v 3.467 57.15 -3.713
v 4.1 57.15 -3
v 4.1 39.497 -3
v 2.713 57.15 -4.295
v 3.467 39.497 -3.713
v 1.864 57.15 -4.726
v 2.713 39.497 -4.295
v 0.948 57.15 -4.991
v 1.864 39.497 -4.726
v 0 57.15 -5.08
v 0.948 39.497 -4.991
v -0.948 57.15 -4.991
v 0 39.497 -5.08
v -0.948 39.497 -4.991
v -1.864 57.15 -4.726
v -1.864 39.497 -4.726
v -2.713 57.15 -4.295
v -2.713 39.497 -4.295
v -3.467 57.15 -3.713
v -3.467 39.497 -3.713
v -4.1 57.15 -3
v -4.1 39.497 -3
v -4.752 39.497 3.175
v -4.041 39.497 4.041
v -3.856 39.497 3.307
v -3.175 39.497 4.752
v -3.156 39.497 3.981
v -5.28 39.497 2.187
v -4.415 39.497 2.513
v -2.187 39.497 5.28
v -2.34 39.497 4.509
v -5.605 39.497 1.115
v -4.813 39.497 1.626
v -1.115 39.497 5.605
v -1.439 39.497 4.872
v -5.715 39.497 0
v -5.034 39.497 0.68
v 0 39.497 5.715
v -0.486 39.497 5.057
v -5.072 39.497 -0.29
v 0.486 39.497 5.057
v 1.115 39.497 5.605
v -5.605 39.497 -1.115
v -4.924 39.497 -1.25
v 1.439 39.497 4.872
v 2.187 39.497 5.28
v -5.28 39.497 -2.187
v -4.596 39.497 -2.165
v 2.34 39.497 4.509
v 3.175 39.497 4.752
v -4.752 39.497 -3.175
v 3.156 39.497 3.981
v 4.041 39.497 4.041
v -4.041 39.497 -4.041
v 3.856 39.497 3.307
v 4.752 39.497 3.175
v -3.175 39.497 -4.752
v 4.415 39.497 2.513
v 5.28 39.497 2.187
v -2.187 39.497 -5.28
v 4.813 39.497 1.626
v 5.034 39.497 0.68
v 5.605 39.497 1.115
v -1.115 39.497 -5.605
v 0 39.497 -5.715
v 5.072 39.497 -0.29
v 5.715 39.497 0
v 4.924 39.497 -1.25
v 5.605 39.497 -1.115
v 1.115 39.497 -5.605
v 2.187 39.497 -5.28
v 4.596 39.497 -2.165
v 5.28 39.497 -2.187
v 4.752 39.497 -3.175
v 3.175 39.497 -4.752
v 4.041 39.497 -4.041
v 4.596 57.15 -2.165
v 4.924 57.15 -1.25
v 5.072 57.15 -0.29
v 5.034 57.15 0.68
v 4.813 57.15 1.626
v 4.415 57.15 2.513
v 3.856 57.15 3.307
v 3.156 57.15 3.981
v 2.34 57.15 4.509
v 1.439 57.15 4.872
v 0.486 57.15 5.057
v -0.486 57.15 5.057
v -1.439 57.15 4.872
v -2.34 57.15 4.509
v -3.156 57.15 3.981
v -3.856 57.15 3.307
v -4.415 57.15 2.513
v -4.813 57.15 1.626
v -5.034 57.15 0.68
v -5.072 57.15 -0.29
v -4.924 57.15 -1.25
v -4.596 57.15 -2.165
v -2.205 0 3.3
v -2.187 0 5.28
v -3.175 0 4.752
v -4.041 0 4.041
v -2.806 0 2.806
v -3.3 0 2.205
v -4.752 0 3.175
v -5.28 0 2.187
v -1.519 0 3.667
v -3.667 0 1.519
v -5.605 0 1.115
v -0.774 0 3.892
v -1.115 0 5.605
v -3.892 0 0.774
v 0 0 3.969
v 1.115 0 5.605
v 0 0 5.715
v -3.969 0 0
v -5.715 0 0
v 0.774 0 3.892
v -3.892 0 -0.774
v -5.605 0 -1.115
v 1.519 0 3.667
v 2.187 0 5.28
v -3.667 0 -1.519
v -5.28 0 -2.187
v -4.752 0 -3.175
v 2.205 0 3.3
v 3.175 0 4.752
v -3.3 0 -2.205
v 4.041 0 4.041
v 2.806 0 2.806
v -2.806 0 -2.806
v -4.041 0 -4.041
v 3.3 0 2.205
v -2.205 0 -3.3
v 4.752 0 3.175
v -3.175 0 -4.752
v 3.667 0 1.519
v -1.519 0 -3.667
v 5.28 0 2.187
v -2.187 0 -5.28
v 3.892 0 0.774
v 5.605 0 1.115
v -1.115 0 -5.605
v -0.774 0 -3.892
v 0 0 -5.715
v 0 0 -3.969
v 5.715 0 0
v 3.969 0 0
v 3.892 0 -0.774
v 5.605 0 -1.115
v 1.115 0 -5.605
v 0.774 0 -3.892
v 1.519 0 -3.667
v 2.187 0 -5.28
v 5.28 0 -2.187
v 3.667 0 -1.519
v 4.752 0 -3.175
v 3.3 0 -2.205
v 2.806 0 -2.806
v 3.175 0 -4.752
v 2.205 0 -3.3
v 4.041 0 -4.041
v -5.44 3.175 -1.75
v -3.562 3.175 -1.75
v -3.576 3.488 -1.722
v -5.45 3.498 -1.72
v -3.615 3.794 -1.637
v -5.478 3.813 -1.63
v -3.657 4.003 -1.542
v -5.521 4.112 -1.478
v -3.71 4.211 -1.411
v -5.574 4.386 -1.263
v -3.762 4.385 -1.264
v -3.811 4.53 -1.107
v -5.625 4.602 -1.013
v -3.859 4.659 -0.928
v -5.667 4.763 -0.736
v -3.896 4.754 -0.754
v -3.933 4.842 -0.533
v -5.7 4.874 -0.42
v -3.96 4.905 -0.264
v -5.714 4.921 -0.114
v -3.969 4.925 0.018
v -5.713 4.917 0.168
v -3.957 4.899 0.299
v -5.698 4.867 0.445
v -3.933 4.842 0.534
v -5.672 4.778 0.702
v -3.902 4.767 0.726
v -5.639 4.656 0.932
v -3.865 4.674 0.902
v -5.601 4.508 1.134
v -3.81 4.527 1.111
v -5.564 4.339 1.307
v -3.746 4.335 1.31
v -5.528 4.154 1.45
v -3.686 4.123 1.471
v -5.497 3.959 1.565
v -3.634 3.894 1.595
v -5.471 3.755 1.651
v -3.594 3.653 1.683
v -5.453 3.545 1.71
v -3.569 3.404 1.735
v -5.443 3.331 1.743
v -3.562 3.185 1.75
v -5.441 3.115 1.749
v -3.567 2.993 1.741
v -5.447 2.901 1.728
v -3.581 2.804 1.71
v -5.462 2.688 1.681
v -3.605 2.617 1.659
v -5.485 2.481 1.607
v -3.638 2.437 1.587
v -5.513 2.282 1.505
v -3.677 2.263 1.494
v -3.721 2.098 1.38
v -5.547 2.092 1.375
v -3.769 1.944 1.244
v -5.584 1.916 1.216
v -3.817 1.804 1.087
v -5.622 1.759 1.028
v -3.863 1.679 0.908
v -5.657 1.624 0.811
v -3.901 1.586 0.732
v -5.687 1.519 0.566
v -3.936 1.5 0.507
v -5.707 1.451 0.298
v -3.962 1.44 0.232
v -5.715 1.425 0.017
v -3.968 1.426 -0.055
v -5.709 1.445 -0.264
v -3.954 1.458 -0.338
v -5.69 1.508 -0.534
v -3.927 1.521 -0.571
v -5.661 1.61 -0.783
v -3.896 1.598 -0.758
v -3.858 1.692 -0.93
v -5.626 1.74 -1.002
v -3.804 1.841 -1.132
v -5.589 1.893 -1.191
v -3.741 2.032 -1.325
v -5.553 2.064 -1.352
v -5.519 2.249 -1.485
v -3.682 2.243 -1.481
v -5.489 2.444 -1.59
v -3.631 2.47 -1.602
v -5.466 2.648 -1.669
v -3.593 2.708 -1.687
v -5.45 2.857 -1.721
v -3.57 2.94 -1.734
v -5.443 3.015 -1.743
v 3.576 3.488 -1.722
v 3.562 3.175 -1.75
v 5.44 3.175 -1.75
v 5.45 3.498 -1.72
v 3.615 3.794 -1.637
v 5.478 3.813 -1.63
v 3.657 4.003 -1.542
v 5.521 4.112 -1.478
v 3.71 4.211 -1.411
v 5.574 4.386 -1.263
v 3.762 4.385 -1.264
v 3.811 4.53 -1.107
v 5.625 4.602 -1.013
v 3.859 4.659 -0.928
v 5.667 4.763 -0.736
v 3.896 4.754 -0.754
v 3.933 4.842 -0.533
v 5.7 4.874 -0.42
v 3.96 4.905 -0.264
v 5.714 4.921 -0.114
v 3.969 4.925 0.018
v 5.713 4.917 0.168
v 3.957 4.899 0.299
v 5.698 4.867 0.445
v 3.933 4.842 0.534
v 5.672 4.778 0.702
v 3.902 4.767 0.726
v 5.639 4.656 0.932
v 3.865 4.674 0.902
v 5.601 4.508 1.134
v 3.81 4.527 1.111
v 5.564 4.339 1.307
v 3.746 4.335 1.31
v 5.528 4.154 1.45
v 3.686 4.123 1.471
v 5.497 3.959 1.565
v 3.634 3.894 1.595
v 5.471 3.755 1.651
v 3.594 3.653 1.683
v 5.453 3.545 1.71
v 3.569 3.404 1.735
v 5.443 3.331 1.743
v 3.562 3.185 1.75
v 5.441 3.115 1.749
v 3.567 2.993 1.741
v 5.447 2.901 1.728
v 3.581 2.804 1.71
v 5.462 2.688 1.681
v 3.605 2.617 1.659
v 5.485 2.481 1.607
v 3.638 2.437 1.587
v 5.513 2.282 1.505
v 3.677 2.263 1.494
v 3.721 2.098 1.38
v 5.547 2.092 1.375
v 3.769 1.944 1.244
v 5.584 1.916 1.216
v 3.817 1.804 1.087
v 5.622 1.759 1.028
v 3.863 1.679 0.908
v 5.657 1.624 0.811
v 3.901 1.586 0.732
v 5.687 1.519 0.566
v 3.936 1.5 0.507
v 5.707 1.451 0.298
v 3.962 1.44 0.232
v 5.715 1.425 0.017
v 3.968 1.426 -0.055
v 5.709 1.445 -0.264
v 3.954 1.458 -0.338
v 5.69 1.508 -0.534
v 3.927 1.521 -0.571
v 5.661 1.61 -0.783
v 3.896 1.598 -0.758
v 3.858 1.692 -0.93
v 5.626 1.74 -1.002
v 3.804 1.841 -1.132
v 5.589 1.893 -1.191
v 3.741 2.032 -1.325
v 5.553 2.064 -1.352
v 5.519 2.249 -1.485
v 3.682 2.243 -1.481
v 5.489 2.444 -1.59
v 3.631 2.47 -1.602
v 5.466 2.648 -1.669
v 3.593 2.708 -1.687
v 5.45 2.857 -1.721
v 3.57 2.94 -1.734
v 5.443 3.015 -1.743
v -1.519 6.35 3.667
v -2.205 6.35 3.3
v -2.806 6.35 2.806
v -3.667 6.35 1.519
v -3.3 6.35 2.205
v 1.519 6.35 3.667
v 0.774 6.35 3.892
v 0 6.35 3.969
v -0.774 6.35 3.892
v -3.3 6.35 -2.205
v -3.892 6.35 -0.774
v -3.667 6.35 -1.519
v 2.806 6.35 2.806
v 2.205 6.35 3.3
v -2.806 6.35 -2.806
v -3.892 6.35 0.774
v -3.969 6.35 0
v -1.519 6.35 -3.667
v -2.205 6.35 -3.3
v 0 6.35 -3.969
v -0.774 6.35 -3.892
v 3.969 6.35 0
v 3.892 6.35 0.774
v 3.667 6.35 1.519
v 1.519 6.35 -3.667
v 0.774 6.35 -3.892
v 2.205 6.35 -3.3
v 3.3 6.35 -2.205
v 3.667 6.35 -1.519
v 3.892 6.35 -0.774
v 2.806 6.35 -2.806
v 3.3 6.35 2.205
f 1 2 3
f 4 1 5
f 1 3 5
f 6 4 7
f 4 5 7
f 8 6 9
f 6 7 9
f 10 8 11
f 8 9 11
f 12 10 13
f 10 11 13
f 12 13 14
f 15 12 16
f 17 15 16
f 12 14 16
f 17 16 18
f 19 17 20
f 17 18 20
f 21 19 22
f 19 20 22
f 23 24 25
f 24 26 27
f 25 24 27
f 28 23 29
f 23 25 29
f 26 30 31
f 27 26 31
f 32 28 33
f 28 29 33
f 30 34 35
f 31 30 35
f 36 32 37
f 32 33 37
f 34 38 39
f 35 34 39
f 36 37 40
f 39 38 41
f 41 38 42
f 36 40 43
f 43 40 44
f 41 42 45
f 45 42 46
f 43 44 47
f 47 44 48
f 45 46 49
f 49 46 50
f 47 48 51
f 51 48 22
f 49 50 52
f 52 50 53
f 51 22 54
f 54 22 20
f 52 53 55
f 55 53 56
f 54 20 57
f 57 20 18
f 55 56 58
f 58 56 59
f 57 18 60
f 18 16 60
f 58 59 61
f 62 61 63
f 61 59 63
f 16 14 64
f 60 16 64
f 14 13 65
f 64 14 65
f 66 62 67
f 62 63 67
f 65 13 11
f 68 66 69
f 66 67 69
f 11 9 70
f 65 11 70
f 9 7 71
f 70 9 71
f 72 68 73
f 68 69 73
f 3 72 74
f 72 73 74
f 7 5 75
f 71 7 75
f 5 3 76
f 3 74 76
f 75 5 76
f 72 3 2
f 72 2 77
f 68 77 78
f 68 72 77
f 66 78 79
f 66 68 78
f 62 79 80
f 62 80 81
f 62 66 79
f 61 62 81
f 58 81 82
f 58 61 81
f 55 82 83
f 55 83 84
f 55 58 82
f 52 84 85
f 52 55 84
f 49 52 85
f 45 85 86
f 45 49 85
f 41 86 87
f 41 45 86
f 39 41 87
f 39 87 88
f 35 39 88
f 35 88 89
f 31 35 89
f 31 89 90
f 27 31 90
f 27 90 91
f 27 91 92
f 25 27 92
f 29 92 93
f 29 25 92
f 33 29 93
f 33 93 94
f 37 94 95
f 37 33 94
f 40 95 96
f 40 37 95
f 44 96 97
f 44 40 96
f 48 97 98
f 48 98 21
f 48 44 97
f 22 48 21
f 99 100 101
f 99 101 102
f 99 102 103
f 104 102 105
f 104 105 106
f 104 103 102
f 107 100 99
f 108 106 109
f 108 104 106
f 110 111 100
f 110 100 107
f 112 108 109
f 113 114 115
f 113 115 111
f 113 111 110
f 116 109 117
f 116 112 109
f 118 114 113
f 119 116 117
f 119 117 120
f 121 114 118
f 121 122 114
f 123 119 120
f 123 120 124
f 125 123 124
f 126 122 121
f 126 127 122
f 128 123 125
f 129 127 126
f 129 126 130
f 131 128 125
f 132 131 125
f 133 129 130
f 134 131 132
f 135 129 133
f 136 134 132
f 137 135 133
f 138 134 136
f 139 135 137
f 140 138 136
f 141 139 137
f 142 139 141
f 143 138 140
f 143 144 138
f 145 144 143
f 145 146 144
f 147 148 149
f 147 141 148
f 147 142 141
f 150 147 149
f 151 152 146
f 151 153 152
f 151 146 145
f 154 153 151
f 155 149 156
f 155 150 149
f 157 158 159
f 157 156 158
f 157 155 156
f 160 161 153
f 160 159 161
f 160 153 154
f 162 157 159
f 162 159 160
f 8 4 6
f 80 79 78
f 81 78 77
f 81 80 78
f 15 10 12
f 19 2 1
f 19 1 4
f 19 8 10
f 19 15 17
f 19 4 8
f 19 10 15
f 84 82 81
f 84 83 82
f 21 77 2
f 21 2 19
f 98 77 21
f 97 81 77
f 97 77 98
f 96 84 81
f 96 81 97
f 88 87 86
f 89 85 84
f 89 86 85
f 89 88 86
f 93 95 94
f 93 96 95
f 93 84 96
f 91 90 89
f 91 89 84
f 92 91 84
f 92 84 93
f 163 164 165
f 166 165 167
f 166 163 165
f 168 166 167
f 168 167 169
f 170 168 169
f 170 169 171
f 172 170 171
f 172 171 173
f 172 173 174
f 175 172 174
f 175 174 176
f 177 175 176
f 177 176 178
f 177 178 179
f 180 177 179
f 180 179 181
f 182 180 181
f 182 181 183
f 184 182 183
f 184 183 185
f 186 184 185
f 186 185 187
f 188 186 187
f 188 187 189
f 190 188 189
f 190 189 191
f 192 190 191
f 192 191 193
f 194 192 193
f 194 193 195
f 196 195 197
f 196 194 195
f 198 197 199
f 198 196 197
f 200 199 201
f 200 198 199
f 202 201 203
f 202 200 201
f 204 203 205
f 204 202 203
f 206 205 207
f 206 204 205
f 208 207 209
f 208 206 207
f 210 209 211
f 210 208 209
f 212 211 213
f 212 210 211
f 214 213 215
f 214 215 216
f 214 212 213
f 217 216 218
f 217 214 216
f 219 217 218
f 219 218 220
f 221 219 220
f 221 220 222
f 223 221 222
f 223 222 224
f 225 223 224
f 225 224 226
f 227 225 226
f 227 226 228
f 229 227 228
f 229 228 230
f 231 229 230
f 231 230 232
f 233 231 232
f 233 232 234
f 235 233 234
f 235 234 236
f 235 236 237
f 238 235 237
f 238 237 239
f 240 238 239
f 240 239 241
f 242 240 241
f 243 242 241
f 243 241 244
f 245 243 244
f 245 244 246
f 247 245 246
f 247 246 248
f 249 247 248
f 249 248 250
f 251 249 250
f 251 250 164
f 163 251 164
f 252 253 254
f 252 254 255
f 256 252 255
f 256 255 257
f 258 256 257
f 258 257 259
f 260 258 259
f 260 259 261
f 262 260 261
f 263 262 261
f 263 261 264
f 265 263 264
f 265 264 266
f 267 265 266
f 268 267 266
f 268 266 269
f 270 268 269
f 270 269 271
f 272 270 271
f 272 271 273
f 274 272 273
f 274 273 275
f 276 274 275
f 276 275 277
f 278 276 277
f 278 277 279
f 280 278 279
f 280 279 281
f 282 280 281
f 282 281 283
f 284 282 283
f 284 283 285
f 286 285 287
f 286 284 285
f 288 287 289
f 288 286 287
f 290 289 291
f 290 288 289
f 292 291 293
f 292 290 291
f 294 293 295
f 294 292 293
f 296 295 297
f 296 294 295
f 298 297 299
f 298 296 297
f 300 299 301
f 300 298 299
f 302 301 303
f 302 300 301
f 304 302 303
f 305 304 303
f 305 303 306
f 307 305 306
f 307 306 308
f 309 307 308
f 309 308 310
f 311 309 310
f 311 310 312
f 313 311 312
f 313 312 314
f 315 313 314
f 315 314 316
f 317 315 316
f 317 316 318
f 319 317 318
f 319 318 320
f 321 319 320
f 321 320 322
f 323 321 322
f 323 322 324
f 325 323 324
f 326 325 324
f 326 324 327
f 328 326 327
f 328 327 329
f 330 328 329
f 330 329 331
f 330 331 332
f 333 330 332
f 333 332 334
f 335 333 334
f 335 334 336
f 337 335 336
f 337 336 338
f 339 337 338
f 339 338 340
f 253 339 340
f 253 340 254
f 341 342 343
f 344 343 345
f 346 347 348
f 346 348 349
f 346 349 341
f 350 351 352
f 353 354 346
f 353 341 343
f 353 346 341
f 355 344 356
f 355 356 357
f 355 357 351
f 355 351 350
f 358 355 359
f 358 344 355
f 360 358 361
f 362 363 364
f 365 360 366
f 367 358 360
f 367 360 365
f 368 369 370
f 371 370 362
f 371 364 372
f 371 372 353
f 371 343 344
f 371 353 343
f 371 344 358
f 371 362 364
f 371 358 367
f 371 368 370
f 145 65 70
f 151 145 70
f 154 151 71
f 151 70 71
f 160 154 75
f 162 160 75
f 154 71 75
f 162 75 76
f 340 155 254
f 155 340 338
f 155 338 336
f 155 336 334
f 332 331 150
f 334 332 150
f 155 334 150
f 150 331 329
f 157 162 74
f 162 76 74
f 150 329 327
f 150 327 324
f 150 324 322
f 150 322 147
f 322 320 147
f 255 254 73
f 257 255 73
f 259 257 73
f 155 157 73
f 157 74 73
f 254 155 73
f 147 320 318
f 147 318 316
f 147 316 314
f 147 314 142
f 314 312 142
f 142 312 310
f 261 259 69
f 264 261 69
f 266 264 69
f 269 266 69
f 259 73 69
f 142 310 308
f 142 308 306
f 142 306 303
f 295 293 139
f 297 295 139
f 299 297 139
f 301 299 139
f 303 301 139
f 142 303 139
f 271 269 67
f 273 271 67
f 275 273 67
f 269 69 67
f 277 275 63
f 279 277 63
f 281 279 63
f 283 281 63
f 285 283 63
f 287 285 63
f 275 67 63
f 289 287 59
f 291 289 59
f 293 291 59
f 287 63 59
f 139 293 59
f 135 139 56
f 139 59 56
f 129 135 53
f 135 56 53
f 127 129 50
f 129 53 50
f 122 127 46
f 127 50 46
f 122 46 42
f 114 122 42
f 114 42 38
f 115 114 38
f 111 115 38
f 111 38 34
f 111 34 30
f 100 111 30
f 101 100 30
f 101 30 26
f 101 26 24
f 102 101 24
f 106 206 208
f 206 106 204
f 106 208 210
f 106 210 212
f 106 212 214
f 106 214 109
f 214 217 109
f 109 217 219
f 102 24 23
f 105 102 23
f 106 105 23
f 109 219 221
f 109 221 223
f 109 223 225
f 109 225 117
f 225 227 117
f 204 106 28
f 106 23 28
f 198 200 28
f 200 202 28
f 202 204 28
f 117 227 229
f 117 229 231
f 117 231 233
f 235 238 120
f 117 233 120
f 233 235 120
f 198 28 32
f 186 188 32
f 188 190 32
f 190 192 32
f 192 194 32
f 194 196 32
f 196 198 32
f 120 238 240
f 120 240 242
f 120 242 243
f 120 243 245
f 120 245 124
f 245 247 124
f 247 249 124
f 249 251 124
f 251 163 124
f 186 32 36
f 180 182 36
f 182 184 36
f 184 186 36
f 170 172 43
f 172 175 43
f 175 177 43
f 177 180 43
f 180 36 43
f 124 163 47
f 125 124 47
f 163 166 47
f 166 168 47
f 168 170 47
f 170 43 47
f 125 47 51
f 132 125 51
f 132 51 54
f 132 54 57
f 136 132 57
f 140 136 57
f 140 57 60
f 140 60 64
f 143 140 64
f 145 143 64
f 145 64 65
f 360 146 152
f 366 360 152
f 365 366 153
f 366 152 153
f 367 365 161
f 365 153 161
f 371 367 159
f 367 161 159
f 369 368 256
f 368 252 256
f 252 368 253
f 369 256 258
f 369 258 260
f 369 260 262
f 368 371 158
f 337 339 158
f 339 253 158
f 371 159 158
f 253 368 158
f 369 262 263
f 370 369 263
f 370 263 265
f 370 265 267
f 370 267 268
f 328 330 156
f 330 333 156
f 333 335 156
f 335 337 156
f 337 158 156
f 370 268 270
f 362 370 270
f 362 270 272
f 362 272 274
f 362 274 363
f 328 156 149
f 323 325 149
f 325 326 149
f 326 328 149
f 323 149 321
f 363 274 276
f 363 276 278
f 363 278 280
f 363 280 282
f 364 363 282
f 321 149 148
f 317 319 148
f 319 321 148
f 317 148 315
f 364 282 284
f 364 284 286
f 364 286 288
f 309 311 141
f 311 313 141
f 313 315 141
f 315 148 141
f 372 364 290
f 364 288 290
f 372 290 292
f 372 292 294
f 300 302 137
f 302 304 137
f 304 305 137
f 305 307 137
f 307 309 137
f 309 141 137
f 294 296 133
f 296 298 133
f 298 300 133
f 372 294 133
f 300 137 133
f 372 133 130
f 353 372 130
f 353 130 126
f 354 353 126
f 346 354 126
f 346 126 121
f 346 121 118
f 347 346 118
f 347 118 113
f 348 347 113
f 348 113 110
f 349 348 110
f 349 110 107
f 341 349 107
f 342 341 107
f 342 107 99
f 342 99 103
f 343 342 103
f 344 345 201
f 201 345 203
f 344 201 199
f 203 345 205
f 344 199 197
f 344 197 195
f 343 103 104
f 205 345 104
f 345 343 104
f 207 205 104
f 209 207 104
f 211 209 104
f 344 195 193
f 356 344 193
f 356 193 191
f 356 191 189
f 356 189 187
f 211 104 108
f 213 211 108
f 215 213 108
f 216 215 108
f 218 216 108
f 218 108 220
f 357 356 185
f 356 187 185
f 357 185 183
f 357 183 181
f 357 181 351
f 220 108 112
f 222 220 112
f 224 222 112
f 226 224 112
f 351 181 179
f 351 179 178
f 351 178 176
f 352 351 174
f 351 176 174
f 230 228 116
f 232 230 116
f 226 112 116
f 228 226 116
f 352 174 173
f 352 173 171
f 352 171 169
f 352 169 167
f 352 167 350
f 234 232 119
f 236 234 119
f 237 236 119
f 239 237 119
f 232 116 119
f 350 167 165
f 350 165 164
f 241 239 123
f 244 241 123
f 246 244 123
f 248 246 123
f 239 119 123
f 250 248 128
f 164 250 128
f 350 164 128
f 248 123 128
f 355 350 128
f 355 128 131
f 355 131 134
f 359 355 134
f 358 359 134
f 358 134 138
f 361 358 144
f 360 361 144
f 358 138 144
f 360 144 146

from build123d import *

# Parameters (mm, degrees)
BOSS_EXTRUDE1_DEPTH      = 57.15
BOSS_EXTRUDE2_DEPTH      = 57.15
BOSS_EXTRUDE3_START      = -6.35
BOSS_EXTRUDE3_DEPTH      = 6.35
SKETCH5_R                = 3.96875
CUT_EXTRUDE1_DEPTH       = 6.35
BOSS_EXTRUDE4_DEPTH      = 6.35
BOSS_EXTRUDE4_DEPTH_BACK = 33.147
SKETCH7_R                = 5.715
SKETCH7_R_2              = 3.96875
CUT_EXTRUDE2_DEPTH       = 59.440702853
CUT_EXTRUDE2_DEPTH_BACK  = 59.440702853
SKETCH6_R                = 1.75


with BuildPart() as part:
    # Sketch1 → Boss-Extrude1 (new body)
    with BuildSketch(Plane(origin=(0, 0, 0), x_dir=(1, 0, 0), z_dir=(0, 1, 0))):
        with BuildLine():
            Line((-4.099560952, 3), (4.099560952, 3))
            ThreePointArc((4.099560952, 3), (0, -5.08), (-4.099560952, 3))
        make_face()
    extrude(amount=BOSS_EXTRUDE1_DEPTH)

    # Sketch3 → Boss-Extrude2 (add)
    with BuildSketch(Plane.XZ):
        with BuildLine():
            Line((-4.099560952, -3), (4.099560952, -3))
            ThreePointArc((4.099560952, -3), (0, -5.08), (-4.099560952, -3))
        make_face()
    extrude(amount=-BOSS_EXTRUDE2_DEPTH)

    # Sketch4 → Boss-Extrude3 (add)
    with BuildSketch(Plane(origin=(0, 57.15, 0), x_dir=(1, 0, 0), z_dir=(0, 1, 0)).offset(BOSS_EXTRUDE3_START)):
        with BuildLine():
            Line((-4.099560952, 3), (4.099560952, 3))
            ThreePointArc((4.099560952, 3), (0, 5.08), (-4.099560952, 3))
        make_face()
    extrude(amount=BOSS_EXTRUDE3_DEPTH)

    # Sketch5 → Cut-Extrude1 (cut)
    with BuildSketch(Plane.XZ):
        with Locations(Location((0, 0, 0), (0, 0, 270))):
            Circle(SKETCH5_R)
    extrude(amount=-CUT_EXTRUDE1_DEPTH, mode=Mode.SUBTRACT)

    # Sketch7 → Boss-Extrude4 (add, two sides: drawn at the far end of the back side and taken through both)
    with BuildSketch(Plane(origin=(0, 6.35, 0), x_dir=(-1, 0, 0), z_dir=(0, -1, 0)).offset(-BOSS_EXTRUDE4_DEPTH_BACK)):
        with Locations(Location((0, 0, 0), (0, 0, 90))):
            Circle(SKETCH7_R)
        with Locations(Location((0, 0, 0), (0, 0, 90))):
            Circle(SKETCH7_R_2, mode=Mode.SUBTRACT)
    extrude(amount=BOSS_EXTRUDE4_DEPTH + BOSS_EXTRUDE4_DEPTH_BACK)

    # Sketch6 → Cut-Extrude2 (cut, two sides: drawn at the far end of the back side and taken through both)
    with BuildSketch(Plane(origin=(5.08, 0, 0), x_dir=(0, 0, -1), z_dir=(1, 0, 0)).offset(-CUT_EXTRUDE2_DEPTH_BACK)):
        with Locations((0, 3.175)):
            Circle(SKETCH6_R)
    extrude(amount=CUT_EXTRUDE2_DEPTH + CUT_EXTRUDE2_DEPTH_BACK, mode=Mode.SUBTRACT)


solid = part.part
